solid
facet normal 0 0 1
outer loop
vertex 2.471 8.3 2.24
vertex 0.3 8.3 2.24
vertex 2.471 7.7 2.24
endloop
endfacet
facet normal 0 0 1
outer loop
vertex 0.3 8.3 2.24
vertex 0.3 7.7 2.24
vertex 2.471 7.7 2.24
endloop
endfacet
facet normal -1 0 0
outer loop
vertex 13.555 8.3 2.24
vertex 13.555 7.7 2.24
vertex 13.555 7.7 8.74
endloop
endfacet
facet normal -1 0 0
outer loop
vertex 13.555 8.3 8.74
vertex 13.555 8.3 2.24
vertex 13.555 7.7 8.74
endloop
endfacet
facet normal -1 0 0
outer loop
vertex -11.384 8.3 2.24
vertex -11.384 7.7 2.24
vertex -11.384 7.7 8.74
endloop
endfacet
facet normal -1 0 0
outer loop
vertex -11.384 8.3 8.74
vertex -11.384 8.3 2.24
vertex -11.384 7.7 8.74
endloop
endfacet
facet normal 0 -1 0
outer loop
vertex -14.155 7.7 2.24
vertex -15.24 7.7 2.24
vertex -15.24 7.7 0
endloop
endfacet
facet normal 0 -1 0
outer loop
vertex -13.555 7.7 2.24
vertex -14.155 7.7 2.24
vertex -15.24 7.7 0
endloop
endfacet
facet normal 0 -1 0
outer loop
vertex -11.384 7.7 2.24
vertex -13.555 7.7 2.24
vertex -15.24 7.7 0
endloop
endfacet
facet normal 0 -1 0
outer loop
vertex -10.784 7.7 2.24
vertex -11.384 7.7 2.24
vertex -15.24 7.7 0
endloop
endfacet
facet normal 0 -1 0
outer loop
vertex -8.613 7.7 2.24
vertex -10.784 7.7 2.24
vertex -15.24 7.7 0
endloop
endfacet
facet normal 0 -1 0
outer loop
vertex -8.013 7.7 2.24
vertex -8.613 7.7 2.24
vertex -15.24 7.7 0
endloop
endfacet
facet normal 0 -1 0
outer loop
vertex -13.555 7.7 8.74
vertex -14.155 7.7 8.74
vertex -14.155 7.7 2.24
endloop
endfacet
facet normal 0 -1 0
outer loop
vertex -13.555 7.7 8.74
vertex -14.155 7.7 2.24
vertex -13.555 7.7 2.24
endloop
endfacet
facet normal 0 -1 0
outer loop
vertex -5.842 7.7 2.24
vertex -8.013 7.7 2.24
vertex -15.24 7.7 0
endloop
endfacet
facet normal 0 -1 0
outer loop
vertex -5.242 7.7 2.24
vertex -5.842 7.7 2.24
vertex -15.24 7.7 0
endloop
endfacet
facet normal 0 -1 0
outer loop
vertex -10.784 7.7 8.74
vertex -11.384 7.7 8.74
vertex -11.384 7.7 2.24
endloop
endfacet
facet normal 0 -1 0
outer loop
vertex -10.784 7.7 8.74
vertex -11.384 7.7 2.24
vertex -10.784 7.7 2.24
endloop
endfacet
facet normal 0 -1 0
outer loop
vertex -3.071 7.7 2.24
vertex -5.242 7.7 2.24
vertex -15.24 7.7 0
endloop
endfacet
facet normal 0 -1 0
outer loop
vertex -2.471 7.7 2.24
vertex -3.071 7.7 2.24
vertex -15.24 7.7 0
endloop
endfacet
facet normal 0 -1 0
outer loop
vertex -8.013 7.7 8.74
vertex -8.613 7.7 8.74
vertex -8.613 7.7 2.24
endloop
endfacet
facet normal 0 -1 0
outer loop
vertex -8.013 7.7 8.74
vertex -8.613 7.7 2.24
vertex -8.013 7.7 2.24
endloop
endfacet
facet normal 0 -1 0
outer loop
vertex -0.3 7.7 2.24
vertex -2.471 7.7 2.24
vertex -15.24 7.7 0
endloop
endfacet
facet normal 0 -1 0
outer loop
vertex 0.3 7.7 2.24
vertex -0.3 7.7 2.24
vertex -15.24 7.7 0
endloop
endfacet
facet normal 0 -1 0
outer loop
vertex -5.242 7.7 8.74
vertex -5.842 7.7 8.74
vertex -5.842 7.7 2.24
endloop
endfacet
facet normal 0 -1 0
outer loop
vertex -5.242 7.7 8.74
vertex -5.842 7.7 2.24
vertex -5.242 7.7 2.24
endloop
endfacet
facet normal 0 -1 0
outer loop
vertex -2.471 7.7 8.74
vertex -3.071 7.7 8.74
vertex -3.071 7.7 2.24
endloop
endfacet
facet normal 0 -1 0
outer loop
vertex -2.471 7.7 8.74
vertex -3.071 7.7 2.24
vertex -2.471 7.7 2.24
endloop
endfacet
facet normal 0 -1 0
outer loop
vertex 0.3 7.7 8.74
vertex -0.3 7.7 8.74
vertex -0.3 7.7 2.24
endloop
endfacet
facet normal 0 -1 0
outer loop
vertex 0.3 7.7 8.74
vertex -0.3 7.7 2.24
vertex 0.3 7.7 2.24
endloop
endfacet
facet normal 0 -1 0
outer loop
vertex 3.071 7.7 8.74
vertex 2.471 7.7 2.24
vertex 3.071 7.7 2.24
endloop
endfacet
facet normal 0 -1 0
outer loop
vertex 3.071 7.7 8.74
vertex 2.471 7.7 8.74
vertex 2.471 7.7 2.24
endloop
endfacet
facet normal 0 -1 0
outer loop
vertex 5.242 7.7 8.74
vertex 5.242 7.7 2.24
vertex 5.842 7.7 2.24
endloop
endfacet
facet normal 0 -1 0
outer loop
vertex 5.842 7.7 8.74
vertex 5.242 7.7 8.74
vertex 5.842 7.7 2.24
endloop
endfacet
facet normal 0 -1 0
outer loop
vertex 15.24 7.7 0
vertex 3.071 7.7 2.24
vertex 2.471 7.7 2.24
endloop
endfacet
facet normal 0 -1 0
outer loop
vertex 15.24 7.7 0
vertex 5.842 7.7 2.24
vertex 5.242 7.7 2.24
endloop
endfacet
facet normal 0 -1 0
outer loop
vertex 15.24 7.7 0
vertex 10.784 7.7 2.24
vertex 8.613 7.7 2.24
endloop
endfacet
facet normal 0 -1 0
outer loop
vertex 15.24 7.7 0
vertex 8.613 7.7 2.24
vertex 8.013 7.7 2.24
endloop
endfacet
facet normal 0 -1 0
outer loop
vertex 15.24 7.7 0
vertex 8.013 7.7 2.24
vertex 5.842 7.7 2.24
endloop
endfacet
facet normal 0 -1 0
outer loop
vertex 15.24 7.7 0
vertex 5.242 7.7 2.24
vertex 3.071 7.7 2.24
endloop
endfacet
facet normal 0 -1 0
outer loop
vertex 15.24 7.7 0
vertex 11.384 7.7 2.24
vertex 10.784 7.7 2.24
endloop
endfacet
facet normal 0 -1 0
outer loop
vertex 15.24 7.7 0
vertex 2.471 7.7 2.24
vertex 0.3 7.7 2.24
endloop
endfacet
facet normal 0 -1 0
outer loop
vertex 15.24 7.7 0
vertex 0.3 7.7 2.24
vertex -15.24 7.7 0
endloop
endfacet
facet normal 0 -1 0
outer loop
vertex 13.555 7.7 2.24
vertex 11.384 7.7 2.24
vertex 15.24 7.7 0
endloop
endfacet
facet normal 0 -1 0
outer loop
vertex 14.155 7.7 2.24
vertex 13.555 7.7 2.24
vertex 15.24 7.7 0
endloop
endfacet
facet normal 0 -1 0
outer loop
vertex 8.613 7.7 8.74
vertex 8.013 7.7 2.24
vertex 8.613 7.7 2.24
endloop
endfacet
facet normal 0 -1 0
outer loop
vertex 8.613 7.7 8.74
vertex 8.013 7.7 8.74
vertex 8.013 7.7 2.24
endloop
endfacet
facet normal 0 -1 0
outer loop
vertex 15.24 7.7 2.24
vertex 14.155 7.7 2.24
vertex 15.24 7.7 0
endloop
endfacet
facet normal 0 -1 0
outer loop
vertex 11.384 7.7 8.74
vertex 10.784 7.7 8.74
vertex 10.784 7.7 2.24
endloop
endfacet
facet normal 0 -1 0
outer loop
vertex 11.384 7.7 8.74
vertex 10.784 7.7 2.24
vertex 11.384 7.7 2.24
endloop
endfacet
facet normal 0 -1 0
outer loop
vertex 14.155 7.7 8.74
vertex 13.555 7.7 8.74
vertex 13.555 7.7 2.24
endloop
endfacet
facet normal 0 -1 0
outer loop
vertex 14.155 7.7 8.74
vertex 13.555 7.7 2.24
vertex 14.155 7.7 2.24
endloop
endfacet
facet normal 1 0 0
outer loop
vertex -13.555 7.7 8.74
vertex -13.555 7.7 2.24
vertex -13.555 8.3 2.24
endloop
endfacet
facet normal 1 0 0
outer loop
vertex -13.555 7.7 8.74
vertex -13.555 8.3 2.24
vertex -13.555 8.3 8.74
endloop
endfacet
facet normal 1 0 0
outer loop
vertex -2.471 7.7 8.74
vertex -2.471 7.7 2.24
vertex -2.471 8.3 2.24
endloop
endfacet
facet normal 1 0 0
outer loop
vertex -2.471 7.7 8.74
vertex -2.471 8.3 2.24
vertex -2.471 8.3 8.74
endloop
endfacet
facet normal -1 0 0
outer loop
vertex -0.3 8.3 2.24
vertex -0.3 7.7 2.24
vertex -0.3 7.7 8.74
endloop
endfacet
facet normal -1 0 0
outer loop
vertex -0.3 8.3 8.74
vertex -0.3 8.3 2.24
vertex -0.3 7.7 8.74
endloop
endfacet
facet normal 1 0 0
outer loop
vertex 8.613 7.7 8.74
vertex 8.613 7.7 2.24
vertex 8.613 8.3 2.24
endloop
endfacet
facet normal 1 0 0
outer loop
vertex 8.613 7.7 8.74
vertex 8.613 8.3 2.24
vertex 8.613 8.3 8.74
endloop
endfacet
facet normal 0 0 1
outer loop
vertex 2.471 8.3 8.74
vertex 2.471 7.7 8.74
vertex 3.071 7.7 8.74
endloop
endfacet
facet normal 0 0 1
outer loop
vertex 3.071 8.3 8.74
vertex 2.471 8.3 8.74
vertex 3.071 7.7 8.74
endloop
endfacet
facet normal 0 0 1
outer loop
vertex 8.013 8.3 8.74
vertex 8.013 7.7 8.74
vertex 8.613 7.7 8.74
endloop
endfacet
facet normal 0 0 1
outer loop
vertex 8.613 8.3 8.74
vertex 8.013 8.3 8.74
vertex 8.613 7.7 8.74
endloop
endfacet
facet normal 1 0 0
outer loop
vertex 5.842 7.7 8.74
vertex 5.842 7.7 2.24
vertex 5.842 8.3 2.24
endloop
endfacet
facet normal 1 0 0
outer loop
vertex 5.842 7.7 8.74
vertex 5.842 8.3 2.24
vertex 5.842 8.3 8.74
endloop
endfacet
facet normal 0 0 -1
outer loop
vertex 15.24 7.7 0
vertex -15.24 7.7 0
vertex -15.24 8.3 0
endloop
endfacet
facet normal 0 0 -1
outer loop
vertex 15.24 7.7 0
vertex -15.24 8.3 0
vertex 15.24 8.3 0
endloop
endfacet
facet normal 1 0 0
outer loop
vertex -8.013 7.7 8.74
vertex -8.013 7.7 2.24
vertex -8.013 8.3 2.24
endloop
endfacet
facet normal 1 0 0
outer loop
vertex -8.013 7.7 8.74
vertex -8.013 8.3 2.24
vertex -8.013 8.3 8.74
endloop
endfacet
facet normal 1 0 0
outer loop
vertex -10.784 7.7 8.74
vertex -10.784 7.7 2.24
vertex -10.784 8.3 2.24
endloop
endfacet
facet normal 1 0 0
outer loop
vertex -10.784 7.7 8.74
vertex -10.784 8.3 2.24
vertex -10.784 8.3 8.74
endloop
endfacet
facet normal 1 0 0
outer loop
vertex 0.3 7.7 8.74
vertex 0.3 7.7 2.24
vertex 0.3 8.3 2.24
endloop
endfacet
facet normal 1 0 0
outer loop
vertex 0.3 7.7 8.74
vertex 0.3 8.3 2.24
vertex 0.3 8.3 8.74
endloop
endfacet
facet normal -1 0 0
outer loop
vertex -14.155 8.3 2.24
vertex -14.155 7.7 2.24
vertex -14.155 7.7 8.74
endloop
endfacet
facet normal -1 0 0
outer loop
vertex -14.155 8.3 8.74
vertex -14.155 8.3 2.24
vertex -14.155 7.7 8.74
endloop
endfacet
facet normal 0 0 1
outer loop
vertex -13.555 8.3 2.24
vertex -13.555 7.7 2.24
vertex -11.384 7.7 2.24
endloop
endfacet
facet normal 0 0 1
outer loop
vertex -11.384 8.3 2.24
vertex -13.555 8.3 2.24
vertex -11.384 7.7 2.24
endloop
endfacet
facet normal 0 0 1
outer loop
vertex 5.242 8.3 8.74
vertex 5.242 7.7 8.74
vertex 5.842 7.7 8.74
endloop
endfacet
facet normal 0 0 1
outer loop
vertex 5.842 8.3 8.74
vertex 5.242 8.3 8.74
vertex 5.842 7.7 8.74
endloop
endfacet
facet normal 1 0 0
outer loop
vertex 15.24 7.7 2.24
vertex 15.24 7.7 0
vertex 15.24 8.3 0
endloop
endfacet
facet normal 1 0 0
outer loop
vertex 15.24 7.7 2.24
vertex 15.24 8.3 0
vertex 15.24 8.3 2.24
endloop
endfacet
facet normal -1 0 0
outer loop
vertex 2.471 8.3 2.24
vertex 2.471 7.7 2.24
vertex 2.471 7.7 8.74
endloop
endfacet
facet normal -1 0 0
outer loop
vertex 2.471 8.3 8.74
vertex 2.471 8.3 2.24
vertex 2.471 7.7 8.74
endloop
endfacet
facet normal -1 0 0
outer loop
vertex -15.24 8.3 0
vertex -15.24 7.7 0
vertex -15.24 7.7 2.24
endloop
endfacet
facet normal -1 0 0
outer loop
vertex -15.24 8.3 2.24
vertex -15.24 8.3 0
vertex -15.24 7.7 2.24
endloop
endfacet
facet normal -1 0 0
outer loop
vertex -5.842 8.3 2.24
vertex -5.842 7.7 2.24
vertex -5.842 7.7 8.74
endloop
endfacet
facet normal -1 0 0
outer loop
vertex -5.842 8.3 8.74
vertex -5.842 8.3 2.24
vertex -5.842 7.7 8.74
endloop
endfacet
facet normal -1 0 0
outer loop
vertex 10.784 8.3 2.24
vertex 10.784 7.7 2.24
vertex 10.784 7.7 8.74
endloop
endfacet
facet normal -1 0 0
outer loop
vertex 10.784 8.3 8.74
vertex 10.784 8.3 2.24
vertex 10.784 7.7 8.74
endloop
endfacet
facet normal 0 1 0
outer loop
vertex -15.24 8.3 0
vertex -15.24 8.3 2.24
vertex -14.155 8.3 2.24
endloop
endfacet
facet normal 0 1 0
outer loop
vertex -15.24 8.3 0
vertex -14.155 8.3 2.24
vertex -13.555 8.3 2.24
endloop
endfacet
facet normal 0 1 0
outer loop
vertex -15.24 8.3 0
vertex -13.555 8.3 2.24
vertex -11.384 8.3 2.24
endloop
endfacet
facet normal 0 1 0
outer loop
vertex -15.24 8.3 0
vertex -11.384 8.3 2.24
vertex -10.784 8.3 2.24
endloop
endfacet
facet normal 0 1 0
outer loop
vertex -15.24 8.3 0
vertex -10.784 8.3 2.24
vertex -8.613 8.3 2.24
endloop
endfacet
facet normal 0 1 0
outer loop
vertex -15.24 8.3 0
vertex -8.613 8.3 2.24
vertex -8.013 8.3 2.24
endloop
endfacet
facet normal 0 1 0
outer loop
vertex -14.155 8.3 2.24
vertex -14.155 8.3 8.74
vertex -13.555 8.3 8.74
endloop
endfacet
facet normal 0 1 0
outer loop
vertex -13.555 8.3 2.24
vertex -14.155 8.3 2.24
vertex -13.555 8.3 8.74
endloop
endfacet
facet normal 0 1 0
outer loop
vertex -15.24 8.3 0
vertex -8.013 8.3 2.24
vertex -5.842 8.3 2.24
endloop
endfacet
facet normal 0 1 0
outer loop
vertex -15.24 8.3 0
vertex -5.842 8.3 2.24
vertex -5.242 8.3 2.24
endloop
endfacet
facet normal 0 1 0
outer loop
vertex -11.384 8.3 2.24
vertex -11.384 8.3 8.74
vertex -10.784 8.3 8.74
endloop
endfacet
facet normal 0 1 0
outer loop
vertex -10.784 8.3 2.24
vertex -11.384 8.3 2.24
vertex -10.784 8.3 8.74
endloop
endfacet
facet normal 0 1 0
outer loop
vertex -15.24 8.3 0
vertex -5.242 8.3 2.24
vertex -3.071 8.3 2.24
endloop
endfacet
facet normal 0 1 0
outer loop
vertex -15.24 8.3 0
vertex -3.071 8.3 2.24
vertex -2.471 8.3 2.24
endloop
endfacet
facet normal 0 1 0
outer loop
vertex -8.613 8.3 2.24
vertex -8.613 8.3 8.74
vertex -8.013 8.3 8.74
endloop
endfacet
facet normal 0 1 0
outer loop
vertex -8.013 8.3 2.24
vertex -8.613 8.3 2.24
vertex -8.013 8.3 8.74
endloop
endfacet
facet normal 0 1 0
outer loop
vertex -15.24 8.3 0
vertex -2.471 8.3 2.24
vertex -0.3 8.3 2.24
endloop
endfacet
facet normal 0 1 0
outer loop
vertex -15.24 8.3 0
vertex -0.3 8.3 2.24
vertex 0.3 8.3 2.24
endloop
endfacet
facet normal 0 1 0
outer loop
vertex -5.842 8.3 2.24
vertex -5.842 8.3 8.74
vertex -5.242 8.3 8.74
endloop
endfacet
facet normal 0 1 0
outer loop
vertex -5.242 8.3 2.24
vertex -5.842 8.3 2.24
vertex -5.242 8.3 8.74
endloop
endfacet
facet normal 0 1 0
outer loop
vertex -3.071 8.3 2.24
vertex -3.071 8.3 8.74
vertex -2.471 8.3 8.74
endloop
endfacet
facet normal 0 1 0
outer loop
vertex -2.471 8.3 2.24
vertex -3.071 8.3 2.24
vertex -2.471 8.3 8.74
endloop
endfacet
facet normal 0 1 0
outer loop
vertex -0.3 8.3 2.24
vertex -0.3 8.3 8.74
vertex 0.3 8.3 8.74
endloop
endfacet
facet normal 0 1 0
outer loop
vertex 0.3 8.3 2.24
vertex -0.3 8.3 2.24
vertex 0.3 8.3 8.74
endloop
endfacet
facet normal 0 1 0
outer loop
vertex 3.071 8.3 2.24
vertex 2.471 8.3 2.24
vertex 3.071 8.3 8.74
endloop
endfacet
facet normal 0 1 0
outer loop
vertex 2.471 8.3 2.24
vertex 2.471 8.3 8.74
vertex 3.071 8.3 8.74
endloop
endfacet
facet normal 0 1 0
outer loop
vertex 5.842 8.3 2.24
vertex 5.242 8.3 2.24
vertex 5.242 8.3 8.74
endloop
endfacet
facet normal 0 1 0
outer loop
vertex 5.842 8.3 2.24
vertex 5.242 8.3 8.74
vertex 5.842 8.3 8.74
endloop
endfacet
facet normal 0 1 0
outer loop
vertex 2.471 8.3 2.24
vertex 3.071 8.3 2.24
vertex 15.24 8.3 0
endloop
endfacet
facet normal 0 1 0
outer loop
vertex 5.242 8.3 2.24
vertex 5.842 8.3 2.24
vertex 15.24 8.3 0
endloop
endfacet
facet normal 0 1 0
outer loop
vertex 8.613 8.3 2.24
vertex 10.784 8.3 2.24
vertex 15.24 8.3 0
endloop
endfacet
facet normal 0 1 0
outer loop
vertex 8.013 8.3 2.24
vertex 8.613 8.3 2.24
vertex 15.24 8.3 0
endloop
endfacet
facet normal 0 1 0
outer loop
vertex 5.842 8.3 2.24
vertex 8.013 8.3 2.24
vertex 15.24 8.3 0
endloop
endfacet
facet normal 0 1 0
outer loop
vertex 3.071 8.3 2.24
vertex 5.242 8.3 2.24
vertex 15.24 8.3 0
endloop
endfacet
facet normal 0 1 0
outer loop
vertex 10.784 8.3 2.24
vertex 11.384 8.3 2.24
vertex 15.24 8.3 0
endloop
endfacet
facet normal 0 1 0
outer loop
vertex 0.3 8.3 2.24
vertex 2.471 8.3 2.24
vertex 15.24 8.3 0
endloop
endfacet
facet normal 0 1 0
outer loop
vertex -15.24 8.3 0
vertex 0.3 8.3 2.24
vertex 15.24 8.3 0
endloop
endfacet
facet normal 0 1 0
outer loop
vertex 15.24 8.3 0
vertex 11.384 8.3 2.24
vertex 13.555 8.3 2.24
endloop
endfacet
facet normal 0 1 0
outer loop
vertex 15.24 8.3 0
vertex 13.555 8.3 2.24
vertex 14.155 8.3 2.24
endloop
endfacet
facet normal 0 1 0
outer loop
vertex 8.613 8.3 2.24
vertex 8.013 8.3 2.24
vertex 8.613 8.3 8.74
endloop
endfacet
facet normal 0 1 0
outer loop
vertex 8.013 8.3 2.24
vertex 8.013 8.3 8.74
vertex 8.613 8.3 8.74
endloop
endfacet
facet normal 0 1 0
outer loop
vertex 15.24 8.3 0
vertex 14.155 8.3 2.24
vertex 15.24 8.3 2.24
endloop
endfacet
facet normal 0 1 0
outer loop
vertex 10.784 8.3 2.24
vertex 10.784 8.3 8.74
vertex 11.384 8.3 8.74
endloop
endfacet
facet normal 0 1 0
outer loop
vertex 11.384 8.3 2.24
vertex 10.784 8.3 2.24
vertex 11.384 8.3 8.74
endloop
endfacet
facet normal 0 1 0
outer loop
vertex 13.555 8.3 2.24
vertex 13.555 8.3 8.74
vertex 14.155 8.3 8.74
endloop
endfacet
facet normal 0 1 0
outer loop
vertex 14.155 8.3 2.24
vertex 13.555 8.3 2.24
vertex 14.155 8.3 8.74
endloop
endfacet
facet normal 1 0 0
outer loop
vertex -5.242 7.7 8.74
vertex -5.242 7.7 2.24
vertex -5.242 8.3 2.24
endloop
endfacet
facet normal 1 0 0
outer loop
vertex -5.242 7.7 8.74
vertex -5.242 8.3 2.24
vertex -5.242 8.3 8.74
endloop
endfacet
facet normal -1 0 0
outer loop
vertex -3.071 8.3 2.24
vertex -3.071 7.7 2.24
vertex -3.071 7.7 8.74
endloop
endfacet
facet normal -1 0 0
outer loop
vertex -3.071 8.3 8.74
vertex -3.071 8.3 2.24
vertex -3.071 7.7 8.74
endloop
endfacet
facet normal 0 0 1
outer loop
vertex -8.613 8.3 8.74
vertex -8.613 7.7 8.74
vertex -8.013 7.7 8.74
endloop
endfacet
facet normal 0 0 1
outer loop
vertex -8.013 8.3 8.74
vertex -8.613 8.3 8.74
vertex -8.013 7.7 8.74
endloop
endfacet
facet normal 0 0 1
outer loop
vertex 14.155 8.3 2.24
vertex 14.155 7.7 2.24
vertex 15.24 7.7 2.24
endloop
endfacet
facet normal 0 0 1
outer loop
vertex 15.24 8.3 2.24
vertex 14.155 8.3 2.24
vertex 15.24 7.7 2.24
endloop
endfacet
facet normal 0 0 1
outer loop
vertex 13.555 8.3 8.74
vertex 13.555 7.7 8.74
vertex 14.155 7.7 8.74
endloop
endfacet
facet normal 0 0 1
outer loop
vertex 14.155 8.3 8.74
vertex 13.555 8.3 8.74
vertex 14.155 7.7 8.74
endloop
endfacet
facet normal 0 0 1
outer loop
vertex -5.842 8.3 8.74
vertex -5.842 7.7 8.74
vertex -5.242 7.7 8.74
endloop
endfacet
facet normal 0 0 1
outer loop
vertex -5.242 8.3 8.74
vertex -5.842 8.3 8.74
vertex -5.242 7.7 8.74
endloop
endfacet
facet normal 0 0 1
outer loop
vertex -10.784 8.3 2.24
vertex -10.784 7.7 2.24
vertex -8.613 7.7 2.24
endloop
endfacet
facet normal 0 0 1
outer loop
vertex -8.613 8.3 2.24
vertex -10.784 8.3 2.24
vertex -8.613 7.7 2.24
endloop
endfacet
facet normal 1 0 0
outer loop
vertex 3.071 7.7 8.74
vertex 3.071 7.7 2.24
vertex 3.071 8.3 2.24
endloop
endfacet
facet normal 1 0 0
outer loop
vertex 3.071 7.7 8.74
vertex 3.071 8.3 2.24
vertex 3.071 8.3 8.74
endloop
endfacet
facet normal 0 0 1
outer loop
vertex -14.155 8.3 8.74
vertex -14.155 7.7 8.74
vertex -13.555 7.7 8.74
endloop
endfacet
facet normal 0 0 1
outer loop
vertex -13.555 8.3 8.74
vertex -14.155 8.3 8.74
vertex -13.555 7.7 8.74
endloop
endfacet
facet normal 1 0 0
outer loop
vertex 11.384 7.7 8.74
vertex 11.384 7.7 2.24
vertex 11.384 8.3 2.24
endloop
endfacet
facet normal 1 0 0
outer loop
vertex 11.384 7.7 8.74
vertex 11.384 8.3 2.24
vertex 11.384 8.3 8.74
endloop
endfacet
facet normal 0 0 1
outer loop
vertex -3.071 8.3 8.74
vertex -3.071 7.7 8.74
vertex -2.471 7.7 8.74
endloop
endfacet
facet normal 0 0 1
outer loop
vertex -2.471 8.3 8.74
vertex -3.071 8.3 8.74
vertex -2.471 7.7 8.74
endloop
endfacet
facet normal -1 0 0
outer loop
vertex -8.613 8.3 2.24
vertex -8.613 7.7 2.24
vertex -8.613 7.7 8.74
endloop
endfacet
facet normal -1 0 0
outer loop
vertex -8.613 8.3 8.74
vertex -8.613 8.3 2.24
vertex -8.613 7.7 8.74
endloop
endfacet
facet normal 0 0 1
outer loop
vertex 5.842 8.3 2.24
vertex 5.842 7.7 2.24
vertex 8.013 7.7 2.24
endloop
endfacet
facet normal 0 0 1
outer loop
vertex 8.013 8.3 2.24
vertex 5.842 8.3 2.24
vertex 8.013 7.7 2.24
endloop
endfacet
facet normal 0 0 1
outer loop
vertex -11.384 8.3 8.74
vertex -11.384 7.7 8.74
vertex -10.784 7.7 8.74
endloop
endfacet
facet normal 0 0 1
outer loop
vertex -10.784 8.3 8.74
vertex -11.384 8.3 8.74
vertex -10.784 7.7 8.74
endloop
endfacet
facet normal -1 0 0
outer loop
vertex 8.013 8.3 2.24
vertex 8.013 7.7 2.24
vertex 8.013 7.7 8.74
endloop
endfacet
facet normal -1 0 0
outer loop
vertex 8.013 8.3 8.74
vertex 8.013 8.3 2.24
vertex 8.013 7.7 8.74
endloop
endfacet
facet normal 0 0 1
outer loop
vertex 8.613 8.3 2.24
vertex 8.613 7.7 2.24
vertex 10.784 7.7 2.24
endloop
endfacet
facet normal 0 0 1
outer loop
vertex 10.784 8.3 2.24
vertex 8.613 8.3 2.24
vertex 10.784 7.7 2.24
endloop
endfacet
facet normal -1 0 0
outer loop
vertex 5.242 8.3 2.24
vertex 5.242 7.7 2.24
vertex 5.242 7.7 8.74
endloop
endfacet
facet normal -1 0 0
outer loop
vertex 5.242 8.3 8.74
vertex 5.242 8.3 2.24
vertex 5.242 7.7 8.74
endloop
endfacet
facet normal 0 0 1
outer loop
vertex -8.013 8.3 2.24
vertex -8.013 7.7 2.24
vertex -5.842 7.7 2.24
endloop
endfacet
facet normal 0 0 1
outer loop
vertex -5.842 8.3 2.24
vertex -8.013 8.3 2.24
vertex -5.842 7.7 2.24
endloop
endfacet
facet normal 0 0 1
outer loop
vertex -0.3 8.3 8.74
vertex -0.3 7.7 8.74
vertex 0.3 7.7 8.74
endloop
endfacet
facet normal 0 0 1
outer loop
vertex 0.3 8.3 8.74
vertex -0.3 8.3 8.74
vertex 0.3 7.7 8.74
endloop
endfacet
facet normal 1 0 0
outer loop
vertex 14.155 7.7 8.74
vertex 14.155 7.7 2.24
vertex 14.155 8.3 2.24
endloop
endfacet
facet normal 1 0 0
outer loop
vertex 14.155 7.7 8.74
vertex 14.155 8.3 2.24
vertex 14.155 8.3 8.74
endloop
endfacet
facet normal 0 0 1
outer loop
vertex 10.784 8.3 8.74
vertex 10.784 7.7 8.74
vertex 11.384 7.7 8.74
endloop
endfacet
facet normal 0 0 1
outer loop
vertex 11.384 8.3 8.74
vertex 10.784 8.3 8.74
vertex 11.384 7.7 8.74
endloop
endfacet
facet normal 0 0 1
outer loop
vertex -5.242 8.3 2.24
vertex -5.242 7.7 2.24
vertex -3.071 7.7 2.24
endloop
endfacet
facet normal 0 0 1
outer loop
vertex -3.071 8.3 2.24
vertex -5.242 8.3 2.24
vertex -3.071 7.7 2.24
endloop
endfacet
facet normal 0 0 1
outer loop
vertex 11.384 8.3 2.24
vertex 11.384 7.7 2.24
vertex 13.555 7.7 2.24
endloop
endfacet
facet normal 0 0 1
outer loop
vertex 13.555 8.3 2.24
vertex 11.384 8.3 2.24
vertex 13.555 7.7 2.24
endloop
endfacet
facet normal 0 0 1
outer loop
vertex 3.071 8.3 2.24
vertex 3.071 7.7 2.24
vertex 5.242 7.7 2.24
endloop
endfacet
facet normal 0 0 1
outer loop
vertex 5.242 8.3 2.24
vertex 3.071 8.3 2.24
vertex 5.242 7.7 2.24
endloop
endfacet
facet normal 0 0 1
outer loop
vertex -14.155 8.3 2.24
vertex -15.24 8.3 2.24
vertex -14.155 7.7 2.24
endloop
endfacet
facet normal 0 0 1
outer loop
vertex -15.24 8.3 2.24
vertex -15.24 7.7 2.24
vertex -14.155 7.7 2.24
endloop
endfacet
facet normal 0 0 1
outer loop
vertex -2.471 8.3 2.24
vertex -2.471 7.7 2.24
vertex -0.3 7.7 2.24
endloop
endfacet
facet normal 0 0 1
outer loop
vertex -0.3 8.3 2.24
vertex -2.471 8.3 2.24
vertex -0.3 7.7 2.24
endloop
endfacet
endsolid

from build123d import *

# Parameters (mm, degrees)
SKETCH006_W            = 30.48
SKETCH006_H            = 8.74
PAD014_DEPTH           = 0.3
SKETCH007_W            = 1.94
SKETCH007_H            = 12.4
POCKET002_DEPTH        = 0.301
POCKET002_DEPTH_BACK   = 0.301
LINEARPATTERN002_COUNT = 12
LINEARPATTERN002_PITCH = 2.770909
LINEARPATTERN003_COUNT = 12
LINEARPATTERN003_PITCH = 2.770909


with BuildPart() as part:
    # Sketch006 → Pad014 (new body, symmetric)
    with BuildSketch(Plane.XZ):
        with Locations((0, 4.37)):
            Rectangle(SKETCH006_W, SKETCH006_H)
    extrude(amount=PAD014_DEPTH, both=True)

    # Sketch007 → Pocket002 (cut, two sides)
    with BuildSketch(Plane.XZ) as pocket002_sk:
        with Locations((-1.27, 8.44)):
            Rectangle(SKETCH007_W, SKETCH007_H)
        with Locations((1.27, 8.44)):
            Rectangle(SKETCH007_W, SKETCH007_H)
    pocket002 = extrude(amount=-POCKET002_DEPTH, mode=Mode.SUBTRACT) + extrude(pocket002_sk.sketch, amount=POCKET002_DEPTH_BACK, mode=Mode.SUBTRACT)

    # LinearPattern002: Pocket002 ×12
    with Locations(*[(i * LINEARPATTERN002_PITCH, 0, 0) for i in range(1, LINEARPATTERN002_COUNT)]):
        add(pocket002, mode=Mode.SUBTRACT)

    # LinearPattern003: Pocket002 ×12
    with Locations(*[(-i * LINEARPATTERN003_PITCH, 0, 0) for i in range(1, LINEARPATTERN003_COUNT)]):
        add(pocket002, mode=Mode.SUBTRACT)


with BuildPart() as part_1:
    # Body022 placement: moved
    add(part.part.moved(Location((0, -8, 0))))


with BuildPart() as part_2:
    # Body025 placement: moved
    add(part_1.part.moved(Location((0, 16, 0))))


solid = part_2.part
